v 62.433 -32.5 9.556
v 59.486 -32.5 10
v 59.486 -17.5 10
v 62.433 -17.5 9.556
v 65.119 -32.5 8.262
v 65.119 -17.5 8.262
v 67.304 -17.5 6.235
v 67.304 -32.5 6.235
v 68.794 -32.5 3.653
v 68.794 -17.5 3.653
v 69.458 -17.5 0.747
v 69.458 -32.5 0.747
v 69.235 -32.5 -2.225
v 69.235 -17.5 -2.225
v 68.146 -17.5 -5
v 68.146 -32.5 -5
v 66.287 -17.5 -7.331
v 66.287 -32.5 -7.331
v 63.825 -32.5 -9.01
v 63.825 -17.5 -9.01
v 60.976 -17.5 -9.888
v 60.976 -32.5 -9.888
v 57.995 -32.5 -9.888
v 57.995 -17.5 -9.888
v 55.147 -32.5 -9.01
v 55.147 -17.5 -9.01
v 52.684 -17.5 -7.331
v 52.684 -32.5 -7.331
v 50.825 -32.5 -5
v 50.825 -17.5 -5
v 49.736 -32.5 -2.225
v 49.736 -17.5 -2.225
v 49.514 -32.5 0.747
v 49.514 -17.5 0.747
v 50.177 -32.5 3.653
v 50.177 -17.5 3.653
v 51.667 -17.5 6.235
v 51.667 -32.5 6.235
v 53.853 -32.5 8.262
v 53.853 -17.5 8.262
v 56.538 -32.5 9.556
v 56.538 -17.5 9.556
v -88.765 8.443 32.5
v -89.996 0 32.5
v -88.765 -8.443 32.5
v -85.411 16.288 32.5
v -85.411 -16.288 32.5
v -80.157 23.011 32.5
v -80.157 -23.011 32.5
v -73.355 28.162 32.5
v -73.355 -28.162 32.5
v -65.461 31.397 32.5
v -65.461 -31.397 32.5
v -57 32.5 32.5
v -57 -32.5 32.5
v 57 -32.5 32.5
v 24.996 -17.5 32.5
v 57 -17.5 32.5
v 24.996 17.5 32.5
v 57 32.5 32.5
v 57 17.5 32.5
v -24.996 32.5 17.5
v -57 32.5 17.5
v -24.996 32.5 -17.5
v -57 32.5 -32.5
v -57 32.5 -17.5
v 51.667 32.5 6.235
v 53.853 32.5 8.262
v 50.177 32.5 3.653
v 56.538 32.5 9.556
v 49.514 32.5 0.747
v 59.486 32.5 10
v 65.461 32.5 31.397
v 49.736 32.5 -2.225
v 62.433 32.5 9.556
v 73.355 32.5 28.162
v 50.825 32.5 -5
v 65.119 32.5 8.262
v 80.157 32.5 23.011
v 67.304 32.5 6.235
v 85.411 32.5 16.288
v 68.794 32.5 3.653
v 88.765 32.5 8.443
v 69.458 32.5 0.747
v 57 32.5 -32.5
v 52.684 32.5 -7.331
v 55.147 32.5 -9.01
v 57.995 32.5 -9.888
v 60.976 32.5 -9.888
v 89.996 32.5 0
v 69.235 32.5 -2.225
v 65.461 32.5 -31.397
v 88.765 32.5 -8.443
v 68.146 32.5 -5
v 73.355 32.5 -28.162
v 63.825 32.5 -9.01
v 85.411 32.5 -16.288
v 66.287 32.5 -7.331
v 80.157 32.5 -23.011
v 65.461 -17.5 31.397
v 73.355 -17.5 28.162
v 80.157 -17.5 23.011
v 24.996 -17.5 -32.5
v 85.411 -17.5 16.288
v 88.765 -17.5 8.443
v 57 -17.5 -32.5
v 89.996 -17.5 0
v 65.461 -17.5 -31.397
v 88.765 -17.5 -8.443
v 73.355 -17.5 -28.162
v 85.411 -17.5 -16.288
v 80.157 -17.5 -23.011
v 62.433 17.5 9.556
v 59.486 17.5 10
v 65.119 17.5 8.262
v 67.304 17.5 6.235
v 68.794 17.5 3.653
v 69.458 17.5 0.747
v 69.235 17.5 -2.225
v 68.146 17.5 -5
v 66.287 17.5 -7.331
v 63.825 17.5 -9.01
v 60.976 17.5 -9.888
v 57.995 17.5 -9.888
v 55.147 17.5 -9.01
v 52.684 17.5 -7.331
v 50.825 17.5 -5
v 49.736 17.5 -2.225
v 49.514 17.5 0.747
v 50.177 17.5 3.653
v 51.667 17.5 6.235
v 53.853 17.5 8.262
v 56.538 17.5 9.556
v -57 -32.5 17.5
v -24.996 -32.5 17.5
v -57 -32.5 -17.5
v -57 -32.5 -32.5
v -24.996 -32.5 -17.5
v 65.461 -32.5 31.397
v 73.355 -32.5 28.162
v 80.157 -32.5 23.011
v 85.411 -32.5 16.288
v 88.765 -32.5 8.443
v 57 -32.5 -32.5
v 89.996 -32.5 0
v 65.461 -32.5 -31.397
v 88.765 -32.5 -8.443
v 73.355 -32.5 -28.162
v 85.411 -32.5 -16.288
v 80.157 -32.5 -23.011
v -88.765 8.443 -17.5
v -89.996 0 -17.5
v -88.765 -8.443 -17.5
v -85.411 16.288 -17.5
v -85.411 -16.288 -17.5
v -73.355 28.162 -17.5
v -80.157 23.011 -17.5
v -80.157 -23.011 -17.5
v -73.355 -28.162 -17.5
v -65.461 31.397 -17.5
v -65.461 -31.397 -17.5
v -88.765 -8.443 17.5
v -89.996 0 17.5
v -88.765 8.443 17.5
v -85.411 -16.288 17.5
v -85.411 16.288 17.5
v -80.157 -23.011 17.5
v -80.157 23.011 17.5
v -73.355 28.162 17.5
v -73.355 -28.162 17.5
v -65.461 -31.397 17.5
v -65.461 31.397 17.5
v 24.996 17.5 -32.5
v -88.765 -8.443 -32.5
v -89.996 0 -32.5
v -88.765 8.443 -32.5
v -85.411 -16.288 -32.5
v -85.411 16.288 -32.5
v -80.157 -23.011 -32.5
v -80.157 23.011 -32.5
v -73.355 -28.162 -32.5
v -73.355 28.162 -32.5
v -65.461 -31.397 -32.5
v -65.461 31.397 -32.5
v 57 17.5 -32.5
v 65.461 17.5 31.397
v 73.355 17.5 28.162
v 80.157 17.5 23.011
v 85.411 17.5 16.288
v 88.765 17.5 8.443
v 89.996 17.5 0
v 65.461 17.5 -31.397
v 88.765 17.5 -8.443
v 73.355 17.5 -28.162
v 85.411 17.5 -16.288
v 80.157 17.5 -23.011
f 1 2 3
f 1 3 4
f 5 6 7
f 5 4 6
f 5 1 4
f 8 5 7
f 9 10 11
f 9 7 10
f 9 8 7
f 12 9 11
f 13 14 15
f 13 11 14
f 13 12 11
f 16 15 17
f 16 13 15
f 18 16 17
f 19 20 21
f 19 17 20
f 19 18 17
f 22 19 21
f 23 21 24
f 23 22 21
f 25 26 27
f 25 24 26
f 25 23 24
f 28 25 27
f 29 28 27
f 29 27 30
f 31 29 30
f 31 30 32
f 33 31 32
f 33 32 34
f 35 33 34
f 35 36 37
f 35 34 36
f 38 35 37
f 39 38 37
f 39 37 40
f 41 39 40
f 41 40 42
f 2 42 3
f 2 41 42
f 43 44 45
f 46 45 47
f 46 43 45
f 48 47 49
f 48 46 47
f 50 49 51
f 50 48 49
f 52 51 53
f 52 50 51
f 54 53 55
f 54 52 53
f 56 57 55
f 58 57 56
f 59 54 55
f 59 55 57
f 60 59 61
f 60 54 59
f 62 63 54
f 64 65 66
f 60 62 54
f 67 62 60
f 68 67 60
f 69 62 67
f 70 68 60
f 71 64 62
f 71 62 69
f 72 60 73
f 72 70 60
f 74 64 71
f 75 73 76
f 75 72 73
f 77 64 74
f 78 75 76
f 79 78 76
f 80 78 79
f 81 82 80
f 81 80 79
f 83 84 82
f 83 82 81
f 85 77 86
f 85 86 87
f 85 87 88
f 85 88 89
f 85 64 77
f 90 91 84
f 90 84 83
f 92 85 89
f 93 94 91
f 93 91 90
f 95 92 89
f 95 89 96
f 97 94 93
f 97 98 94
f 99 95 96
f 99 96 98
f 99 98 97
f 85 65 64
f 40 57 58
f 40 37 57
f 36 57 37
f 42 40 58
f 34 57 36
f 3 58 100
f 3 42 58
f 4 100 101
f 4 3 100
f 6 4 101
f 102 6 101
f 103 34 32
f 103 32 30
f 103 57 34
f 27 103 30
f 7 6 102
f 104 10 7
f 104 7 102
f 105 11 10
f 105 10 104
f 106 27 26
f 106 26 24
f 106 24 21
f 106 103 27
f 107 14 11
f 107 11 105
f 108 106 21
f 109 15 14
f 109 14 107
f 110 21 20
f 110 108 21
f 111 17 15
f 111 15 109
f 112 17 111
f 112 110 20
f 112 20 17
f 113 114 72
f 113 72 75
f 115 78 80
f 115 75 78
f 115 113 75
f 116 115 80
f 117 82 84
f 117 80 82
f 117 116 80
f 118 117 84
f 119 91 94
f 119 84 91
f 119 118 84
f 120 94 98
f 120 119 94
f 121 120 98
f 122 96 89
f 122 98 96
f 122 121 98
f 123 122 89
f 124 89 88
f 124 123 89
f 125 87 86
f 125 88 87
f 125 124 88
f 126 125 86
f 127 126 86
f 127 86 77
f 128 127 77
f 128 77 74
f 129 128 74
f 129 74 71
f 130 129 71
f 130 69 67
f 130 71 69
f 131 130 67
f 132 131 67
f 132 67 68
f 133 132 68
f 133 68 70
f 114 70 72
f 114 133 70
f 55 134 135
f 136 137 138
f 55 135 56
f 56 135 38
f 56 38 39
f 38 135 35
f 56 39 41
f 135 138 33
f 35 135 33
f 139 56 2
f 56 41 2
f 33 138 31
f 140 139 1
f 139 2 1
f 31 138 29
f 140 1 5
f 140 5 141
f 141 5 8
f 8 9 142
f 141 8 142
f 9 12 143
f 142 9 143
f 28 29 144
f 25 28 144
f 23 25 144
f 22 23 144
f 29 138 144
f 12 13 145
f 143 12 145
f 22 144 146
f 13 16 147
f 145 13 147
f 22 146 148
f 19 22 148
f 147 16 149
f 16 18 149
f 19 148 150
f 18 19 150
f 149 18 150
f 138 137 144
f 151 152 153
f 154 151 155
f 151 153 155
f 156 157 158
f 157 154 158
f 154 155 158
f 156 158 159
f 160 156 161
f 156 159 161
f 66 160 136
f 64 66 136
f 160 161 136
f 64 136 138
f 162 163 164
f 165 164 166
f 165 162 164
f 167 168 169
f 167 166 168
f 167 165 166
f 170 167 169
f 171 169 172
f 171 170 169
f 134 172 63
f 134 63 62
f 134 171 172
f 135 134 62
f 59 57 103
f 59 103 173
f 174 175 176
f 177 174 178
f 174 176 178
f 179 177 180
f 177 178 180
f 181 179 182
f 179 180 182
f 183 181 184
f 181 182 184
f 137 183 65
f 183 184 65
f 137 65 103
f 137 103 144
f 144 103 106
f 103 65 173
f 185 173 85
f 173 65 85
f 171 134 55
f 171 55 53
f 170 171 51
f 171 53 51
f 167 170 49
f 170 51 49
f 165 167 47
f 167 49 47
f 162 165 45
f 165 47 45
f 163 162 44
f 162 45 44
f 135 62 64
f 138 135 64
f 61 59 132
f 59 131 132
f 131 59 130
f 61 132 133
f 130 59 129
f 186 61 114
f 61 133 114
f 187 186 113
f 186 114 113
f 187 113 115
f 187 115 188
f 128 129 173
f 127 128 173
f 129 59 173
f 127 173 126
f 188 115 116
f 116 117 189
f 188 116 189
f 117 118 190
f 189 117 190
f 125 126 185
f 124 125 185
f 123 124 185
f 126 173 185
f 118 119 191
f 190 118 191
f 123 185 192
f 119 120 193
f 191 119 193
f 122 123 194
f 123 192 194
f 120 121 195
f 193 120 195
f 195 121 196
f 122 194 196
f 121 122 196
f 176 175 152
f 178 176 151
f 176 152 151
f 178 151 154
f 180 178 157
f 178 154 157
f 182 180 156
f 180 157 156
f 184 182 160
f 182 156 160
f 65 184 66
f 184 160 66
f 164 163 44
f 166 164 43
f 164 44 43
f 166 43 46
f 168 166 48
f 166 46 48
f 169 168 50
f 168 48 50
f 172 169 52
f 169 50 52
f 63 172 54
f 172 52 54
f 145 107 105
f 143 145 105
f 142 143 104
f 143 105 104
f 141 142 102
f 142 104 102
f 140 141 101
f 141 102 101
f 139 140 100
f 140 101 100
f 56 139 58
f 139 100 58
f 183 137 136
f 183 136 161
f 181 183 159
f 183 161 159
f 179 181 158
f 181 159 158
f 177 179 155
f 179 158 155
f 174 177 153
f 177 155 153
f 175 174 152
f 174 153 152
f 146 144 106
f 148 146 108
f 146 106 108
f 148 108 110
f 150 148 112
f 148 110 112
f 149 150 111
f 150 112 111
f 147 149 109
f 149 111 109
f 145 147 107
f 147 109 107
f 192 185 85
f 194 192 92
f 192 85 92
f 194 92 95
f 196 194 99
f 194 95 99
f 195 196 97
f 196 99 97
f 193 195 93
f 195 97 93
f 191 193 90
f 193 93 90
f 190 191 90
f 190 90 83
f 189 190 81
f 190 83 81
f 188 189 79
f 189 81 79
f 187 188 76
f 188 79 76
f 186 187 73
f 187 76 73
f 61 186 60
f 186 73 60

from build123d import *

# Parameters (mm, degrees)
ESBO_O1_W                  = 180
ESBO_O1_H                  = 65
RESSALTO_EXTRUS_O3_DEPTH   = 32.5
FILETE6_R                  = 33
CORTE_EXTRUS_O2_DEPTH      = 116.677353013
CORTE_EXTRUS_O2_DEPTH_BACK = 116.677353013
ESBO_O5_W                  = 65
ESBO_O5_H                  = 35
FILETE7_R                  = 33
CORTE_EXTRUS_O3_DEPTH      = 116.674405799
CORTE_EXTRUS_O3_DEPTH_BACK = 116.674405799
ESBO_O8_W                  = 65
ESBO_O8_H                  = 35
CORTE_EXTRUS_O4_DEPTH      = 116.674405799
CORTE_EXTRUS_O4_DEPTH_BACK = 116.674405799
ESBO_O11_R                 = 10


with BuildPart() as part:
    # Esboço1 → Ressalto-extrusão3 (new, symmetric)
    with BuildSketch(Plane(origin=(0, 0, 0), x_dir=(1, 0, 0), z_dir=(0, 1, 0))):
        Rectangle(ESBO_O1_W, ESBO_O1_H)
    extrude(amount=RESSALTO_EXTRUS_O3_DEPTH, both=True)

    # Filete6
    # the kernel refuses this fillet: 33 mm, written as the material it takes off along each edge
    with BuildSketch(Plane(origin=(90, 115, -32.5), x_dir=(-1, 0, 0), z_dir=(0, -1, 0))) as filete6_piece_1:
        with BuildLine():
            CenterArc((FILETE6_R, -FILETE6_R), FILETE6_R, 90, 90)
            Line((0, -FILETE6_R), (0, 0))
            Line((0, 0), (FILETE6_R, 0))
        make_face()
    extrude(amount=230, mode=Mode.SUBTRACT)
    with BuildSketch(Plane(origin=(90, 115, 32.5), x_dir=(-1, 0, 0), z_dir=(0, -1, 0))) as filete6_piece_2:
        with BuildLine():
            CenterArc((FILETE6_R, FILETE6_R), FILETE6_R, 180, 90)
            Line((0, FILETE6_R), (0, 0))
            Line((0, 0), (FILETE6_R, 0))
        make_face()
    extrude(amount=230, mode=Mode.SUBTRACT)

    # Esboço5 → Corte-extrusão2 (cut, two sides: drawn at the far end of the back side and taken through both)
    with BuildSketch(Plane.XY.offset(32.5).offset(-CORTE_EXTRUS_O2_DEPTH_BACK)):
        with Locations((57.496211904, 0)):
            Rectangle(ESBO_O5_W, ESBO_O5_H)
    extrude(amount=CORTE_EXTRUS_O2_DEPTH + CORTE_EXTRUS_O2_DEPTH_BACK, mode=Mode.SUBTRACT)

    # Filete7
    # the kernel refuses this fillet: 33 mm, written as the material it takes off along each edge
    with BuildSketch(Plane(origin=(-90, -32.5, 115), x_dir=(0, 1, 0), z_dir=(0, 0, -1))) as filete7_piece_1:
        with BuildLine():
            CenterArc((FILETE7_R, FILETE7_R), FILETE7_R, 180, 90)
            Line((0, FILETE7_R), (0, 0))
            Line((0, 0), (FILETE7_R, 0))
        make_face()
    extrude(amount=230, mode=Mode.SUBTRACT)
    with BuildSketch(Plane(origin=(-90, 32.5, 115), x_dir=(0, -1, 0), z_dir=(0, 0, -1))) as filete7_piece_2:
        with BuildLine():
            CenterArc((FILETE7_R, -FILETE7_R), FILETE7_R, 90, 90)
            Line((0, -FILETE7_R), (0, 0))
            Line((0, 0), (FILETE7_R, 0))
        make_face()
    extrude(amount=230, mode=Mode.SUBTRACT)

    # Esboço8 → Corte-extrusão3 (cut, two sides: drawn at the far end of the back side and taken through both)
    with BuildSketch(Plane(origin=(0, 32.5, 0), x_dir=(1, 0, 0), z_dir=(0, 1, 0)).offset(-CORTE_EXTRUS_O3_DEPTH_BACK)):
        with Locations((-57.496211904, 0)):
            Rectangle(ESBO_O8_W, ESBO_O8_H)
    extrude(amount=CORTE_EXTRUS_O3_DEPTH + CORTE_EXTRUS_O3_DEPTH_BACK, mode=Mode.SUBTRACT)

    # Esboço11 → Corte-extrusão4 (cut, two sides: drawn at the far end of the back side and taken through both)
    with BuildSketch(Plane(origin=(0, 32.5, 0), x_dir=(1, 0, 0), z_dir=(0, 1, 0)).offset(-CORTE_EXTRUS_O4_DEPTH_BACK)):
        with Locations(Location((59.485722432, 0, 0), (0, 0, 270))):
            Circle(ESBO_O11_R)
    extrude(amount=CORTE_EXTRUS_O4_DEPTH + CORTE_EXTRUS_O4_DEPTH_BACK, mode=Mode.SUBTRACT)


solid = part.part
